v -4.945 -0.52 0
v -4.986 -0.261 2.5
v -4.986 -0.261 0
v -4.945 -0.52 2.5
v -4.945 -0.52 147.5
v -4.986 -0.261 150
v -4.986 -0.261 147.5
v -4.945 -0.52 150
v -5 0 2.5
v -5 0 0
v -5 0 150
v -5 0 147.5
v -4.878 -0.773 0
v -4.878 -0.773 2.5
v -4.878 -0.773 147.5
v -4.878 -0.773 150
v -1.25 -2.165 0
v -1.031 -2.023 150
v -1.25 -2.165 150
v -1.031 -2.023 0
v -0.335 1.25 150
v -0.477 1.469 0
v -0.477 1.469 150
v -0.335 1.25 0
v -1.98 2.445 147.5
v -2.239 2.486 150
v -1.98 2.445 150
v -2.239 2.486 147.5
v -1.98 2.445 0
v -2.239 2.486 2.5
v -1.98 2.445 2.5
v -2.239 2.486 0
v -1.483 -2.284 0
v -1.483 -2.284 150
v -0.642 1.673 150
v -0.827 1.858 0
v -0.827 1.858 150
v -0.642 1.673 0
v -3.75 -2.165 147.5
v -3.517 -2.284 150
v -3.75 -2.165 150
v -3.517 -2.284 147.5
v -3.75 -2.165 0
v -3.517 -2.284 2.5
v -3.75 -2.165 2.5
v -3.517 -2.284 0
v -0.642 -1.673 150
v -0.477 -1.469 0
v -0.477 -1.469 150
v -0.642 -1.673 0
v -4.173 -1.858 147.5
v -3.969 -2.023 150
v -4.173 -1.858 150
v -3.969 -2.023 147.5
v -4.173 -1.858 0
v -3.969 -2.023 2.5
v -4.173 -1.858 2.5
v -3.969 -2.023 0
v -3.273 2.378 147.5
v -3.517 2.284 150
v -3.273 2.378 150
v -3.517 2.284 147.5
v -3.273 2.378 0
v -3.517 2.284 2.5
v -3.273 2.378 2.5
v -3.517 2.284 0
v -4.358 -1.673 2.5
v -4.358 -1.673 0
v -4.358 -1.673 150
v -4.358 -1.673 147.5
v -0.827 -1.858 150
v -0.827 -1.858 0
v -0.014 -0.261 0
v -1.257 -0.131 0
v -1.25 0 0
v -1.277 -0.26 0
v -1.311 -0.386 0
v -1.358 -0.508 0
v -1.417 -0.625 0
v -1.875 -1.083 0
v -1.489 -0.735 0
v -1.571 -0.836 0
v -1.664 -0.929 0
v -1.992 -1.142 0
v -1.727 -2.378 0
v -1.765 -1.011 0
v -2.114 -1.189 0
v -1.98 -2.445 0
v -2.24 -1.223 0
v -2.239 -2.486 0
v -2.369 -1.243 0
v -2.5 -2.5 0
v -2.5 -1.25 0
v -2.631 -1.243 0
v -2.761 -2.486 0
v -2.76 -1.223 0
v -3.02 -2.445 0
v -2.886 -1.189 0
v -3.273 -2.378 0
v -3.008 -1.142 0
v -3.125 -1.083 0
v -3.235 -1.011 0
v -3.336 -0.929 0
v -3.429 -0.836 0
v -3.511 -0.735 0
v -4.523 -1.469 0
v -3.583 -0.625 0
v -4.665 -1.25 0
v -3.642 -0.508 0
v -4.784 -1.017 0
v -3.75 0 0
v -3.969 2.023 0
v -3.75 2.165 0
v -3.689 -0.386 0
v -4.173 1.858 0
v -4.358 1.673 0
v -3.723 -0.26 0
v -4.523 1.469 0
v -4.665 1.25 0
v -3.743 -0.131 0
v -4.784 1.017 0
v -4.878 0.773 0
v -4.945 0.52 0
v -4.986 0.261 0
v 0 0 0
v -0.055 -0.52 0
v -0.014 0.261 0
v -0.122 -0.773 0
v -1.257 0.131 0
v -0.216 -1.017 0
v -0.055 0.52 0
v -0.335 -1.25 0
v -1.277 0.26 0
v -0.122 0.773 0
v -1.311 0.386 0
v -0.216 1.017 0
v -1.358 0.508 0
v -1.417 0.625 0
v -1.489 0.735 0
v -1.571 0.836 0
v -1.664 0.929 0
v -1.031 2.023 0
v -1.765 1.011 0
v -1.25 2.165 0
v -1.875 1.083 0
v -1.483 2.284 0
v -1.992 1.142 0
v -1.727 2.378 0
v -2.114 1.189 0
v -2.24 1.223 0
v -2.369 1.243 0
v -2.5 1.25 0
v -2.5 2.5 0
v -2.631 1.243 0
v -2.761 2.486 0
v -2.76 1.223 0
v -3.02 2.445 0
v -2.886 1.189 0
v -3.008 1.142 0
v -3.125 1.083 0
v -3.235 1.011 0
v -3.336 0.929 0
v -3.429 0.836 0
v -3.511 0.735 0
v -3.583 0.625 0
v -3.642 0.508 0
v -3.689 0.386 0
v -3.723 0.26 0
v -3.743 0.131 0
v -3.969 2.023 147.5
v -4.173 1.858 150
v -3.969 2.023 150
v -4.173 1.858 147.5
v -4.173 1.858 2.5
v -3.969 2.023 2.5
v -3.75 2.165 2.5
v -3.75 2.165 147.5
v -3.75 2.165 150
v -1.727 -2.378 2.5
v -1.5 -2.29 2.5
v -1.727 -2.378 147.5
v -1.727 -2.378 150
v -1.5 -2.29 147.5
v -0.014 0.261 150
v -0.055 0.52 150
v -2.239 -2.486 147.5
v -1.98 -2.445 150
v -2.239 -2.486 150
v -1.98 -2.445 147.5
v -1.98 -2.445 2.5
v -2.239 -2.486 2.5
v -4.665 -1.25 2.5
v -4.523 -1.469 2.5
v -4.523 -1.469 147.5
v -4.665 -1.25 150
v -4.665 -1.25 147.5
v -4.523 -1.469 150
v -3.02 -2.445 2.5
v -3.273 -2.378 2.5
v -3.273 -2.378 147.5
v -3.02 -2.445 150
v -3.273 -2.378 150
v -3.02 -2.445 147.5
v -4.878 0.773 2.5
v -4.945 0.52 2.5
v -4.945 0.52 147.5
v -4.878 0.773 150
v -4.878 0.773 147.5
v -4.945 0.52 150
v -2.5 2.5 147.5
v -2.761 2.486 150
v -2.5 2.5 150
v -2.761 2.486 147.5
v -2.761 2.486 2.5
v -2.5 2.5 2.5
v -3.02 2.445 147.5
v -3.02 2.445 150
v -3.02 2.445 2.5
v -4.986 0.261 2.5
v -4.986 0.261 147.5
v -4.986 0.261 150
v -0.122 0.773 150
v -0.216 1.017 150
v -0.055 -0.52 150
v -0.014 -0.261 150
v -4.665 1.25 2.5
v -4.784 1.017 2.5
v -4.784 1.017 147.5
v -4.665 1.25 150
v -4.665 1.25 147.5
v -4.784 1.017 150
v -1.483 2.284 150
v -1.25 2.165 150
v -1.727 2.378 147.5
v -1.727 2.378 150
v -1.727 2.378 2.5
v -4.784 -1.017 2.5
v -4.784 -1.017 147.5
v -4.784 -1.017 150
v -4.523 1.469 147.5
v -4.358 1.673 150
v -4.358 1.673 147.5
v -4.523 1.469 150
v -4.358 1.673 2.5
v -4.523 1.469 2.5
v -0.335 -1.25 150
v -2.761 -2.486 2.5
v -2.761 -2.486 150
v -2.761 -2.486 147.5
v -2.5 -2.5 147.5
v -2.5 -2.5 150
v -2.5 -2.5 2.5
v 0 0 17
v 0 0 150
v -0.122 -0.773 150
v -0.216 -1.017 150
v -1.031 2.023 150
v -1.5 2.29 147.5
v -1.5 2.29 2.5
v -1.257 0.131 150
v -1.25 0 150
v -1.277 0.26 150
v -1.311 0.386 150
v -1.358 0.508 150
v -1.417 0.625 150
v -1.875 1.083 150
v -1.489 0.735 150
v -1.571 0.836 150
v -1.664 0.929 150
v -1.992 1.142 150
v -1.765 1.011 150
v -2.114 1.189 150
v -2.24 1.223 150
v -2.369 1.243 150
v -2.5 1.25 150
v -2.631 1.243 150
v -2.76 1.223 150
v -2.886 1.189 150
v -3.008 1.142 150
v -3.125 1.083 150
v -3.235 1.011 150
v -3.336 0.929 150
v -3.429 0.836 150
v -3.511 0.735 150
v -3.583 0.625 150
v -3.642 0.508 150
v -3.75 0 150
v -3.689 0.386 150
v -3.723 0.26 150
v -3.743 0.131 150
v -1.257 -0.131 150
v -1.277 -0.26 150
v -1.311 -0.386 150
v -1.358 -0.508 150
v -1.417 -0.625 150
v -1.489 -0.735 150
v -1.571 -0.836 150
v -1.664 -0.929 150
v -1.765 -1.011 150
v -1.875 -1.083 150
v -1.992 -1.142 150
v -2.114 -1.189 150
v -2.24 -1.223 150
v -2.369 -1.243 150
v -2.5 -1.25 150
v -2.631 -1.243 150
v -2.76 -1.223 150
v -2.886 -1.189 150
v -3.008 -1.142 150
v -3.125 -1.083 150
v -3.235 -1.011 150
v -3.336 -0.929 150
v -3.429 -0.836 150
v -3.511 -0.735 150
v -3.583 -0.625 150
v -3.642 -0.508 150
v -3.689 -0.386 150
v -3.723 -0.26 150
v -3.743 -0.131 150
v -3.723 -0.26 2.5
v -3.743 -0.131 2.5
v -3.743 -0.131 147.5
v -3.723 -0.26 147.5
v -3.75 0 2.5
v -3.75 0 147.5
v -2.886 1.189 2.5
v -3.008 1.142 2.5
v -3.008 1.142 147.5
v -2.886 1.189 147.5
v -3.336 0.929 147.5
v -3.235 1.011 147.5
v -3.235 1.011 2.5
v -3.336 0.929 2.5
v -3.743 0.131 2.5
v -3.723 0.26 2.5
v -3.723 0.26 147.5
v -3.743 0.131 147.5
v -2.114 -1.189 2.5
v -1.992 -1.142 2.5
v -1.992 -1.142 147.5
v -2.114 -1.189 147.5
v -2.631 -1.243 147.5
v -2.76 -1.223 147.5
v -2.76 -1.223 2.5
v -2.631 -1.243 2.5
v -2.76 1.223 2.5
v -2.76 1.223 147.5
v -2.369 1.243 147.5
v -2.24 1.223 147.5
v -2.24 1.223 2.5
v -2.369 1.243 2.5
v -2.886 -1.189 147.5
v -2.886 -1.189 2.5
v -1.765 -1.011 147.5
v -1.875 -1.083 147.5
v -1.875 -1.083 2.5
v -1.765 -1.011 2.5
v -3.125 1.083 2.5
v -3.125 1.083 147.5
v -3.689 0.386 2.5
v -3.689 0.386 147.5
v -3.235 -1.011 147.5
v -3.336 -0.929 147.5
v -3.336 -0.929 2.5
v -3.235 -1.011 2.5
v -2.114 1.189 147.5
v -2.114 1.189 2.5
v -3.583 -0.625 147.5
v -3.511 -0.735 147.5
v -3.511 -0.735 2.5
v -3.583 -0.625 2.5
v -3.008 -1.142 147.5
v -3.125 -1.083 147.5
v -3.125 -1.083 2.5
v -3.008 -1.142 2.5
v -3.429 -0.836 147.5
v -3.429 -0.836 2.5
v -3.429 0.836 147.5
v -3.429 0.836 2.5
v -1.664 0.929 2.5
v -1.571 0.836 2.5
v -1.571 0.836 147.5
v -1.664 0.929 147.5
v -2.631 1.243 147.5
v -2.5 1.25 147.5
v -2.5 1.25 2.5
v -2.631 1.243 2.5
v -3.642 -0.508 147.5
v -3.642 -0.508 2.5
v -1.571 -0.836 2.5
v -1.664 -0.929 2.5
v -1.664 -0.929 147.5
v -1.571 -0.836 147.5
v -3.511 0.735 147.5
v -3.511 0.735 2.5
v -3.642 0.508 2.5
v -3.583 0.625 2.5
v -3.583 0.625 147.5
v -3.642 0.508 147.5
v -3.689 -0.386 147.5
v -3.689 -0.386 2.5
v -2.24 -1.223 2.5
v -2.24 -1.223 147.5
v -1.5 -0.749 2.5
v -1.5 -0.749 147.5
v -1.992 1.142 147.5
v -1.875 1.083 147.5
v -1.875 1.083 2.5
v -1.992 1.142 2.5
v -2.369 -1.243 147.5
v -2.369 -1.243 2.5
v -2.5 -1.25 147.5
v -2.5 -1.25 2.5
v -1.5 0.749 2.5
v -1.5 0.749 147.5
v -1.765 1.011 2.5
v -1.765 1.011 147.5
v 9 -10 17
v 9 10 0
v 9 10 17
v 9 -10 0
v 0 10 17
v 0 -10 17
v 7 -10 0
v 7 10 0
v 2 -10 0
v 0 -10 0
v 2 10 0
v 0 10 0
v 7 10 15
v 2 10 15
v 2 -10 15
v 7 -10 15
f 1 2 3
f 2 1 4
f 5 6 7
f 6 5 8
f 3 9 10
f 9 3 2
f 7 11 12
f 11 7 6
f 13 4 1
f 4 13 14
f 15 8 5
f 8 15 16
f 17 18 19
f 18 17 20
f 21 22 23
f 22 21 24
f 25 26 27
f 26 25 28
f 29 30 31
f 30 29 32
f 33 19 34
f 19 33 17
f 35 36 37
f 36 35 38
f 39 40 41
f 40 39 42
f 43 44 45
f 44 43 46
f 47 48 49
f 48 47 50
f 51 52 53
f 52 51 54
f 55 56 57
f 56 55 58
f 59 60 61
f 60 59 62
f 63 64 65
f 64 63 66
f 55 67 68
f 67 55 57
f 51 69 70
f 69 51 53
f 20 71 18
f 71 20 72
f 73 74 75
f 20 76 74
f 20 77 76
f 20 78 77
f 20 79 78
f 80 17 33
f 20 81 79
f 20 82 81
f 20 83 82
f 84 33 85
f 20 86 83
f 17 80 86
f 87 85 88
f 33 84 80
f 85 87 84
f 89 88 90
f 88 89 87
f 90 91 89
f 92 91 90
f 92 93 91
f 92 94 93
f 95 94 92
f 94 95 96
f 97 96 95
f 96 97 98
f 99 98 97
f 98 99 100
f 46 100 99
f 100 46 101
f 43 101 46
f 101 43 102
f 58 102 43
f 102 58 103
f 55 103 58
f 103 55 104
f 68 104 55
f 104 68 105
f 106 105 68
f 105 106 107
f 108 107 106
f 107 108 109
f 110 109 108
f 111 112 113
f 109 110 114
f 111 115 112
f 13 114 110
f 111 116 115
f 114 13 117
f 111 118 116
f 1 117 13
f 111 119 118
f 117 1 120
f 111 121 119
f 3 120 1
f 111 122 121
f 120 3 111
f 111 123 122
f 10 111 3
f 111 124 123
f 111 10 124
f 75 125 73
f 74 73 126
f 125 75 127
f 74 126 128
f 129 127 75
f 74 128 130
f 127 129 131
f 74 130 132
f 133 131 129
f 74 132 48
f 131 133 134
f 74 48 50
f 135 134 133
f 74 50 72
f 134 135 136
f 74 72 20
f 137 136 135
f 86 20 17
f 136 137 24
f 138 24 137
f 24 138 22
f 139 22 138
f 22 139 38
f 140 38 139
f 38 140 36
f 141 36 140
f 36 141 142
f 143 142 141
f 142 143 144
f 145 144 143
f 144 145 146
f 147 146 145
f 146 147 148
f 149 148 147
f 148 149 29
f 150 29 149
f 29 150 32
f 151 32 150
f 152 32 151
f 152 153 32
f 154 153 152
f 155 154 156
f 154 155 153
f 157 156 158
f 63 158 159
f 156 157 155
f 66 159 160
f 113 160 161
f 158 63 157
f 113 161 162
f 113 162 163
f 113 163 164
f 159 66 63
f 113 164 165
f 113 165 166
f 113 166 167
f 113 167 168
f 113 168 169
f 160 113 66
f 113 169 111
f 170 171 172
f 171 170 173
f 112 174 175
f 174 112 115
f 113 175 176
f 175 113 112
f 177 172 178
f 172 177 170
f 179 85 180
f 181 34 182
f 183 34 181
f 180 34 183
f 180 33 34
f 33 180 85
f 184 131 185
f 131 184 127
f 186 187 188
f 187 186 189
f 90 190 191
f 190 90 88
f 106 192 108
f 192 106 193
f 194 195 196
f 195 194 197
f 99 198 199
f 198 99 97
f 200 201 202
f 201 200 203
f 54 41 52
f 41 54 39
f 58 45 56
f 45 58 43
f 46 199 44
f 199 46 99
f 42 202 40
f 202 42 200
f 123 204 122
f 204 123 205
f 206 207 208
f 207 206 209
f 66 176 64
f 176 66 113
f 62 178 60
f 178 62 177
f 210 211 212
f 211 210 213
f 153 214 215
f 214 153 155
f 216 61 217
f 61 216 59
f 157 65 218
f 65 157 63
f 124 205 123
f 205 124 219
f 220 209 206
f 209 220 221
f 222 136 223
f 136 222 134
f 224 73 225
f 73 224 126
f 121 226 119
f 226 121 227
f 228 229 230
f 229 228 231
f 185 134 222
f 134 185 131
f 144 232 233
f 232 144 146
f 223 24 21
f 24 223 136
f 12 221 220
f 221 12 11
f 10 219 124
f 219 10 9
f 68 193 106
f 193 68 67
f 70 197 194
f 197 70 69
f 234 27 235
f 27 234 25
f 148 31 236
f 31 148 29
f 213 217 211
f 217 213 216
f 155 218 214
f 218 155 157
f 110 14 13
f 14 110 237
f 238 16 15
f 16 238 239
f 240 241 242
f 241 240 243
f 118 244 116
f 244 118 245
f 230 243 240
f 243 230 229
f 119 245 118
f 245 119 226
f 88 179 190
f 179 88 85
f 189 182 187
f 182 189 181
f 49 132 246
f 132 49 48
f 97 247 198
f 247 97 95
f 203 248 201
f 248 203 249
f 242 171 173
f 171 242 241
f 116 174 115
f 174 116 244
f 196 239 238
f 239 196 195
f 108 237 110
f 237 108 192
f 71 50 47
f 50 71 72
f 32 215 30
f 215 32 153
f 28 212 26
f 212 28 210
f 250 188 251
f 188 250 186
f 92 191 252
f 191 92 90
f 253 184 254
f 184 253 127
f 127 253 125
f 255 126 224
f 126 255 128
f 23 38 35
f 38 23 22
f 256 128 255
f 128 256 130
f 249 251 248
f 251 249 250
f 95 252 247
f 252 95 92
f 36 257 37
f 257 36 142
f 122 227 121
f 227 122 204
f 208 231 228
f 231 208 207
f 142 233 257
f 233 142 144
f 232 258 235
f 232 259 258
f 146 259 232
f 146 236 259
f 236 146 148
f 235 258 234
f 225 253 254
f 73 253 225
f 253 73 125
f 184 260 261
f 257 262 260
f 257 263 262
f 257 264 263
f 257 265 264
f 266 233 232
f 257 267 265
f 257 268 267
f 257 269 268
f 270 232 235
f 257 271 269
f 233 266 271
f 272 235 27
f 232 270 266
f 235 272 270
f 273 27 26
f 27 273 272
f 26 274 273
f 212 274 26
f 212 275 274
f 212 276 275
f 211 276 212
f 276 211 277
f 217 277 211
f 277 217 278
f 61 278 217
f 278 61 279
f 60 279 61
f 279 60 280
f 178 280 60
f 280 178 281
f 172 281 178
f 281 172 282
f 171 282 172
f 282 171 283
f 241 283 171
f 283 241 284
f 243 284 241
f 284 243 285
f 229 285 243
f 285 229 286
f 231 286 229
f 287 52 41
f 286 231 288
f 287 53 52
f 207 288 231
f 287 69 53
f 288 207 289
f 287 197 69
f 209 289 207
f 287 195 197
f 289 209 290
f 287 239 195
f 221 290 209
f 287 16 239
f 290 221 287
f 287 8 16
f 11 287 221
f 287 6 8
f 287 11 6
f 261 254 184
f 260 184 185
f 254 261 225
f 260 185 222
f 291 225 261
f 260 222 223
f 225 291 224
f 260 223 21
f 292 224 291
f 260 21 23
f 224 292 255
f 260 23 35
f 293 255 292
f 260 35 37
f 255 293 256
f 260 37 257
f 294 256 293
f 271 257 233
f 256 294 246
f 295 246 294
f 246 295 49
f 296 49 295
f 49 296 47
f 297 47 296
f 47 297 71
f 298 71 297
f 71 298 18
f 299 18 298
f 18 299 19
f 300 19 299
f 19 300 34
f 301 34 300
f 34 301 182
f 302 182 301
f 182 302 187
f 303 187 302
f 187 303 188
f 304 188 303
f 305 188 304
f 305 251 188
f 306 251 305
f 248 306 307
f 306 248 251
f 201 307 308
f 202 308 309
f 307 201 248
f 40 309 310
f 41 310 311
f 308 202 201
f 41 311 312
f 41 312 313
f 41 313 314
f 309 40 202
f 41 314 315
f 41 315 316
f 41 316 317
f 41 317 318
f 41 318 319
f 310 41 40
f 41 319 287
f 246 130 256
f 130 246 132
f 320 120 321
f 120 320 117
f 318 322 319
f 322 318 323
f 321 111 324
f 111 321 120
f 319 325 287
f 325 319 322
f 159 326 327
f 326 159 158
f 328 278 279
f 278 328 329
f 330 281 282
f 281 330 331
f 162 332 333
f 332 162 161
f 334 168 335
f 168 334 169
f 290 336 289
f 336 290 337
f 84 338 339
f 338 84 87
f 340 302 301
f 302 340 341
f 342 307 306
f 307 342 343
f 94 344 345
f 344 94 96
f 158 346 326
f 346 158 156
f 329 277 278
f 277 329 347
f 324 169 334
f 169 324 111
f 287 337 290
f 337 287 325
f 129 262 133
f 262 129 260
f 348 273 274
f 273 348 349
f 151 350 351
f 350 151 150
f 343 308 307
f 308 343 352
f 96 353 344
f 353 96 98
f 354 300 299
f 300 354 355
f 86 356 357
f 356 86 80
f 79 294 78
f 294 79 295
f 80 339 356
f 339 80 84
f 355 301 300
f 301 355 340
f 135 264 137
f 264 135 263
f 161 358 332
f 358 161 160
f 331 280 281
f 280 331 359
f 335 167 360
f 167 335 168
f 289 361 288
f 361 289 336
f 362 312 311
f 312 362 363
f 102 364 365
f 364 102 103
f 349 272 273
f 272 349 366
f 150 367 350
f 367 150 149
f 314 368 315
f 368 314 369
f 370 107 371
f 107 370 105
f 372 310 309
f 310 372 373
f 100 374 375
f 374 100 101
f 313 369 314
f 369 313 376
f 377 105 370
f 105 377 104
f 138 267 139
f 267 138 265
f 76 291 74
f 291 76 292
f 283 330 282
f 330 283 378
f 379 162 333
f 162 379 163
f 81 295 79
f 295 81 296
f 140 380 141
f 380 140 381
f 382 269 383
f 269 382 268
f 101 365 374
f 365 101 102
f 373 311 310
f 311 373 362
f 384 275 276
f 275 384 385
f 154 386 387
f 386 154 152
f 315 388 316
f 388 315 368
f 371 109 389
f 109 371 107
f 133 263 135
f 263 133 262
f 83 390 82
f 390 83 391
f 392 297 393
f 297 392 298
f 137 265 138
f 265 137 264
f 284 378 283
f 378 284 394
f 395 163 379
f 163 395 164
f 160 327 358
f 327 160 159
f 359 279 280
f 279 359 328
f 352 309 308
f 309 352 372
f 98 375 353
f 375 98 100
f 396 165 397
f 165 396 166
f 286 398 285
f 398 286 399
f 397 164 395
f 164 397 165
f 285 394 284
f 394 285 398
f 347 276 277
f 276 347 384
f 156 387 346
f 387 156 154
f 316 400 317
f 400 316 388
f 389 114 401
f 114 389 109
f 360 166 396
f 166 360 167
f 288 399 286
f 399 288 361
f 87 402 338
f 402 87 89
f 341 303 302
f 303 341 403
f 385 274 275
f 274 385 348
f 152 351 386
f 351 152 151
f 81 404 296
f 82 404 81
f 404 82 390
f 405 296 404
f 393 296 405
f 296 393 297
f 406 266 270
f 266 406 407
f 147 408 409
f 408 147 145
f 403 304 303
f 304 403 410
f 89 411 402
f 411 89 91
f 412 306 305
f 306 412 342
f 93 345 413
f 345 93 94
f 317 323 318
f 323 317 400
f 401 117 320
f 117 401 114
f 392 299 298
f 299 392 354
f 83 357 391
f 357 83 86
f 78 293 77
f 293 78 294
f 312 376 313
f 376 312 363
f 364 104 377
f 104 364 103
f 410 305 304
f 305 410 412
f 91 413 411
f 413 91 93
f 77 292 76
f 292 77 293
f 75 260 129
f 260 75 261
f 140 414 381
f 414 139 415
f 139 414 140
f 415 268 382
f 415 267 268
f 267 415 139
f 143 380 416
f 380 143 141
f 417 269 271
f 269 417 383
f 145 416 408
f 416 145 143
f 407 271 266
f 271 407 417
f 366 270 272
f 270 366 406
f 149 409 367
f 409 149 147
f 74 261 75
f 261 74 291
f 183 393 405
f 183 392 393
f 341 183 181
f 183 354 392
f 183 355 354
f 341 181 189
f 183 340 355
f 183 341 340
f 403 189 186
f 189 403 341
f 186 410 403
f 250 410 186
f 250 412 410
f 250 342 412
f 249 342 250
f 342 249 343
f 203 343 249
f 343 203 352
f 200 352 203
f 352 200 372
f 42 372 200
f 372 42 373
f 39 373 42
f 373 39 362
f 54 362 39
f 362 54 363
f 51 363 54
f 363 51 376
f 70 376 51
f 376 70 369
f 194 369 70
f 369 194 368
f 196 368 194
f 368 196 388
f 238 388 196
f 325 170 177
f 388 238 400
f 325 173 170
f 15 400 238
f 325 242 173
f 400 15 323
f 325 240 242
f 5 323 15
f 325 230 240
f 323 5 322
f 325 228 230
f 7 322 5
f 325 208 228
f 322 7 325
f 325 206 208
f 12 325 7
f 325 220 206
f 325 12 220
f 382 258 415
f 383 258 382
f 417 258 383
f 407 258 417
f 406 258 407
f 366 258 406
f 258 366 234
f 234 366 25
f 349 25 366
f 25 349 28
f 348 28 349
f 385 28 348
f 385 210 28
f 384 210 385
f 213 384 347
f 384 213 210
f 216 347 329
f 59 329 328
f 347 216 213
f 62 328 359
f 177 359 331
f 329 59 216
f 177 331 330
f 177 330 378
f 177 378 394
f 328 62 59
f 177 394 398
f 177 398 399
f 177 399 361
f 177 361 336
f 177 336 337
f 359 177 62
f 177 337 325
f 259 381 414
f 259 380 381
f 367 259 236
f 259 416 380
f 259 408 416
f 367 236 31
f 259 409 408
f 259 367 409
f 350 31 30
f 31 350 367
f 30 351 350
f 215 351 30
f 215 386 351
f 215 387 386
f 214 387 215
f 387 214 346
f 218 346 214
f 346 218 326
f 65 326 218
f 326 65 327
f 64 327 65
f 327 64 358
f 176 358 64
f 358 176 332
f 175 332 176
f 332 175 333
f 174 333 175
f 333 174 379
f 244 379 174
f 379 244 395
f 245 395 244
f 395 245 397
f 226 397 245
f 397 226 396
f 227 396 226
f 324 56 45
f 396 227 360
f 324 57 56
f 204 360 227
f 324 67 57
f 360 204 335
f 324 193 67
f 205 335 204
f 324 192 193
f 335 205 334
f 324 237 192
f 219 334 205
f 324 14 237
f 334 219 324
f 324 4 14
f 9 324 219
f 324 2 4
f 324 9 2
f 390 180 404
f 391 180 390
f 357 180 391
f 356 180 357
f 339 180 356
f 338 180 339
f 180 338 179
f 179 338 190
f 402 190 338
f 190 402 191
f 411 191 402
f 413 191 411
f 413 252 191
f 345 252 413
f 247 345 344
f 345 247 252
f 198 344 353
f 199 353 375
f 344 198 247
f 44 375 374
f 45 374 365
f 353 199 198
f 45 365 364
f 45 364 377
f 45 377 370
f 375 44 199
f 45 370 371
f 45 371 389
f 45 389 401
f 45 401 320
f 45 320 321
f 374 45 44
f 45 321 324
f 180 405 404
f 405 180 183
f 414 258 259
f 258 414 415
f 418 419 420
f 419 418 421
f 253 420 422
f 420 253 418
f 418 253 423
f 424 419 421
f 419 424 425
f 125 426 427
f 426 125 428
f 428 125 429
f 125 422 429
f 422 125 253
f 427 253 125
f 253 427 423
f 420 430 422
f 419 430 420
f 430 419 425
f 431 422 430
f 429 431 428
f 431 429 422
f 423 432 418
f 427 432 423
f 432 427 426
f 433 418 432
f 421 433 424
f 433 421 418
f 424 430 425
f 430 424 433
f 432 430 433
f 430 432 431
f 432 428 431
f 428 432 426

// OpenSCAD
$fn = 60;

//engravepercente is from 0 to 100, close to 0 you get a full bow, close to 100 you get a thin bow 
//add some tolerance for filamentthickness
module bow(height, filamentthickness, bowthickness, engravepercent) {
        bowdiameter = filamentthickness + bowthickness;
        translate([-bowdiameter/2, 0, height/2]) {
                rotate([0, 0, 180]) {
                        difference() {
                                cylinder(d=bowdiameter, h = height, center = true);
                                cylinder(d=filamentthickness, h = height, center = true);
                                translate([ (bowdiameter - (bowdiameter * engravepercent/100)) /2, 0, 0]) {
                                        cube([ bowdiameter * engravepercent/100, bowdiameter,height - (bowthickness * 2)], center = true
                                        );
                                }
                        }
                }
        }
}

module clip(frameheight, framethickness, clipthickness) {
       translate([0, -10,0]) { 
                difference() {
                       cube([framethickness + (2 * clipthickness), 20, frameheight + clipthickness]);
                        translate([clipthickness, 0, 0]) {
                                cube([framethickness, 20, frameheight]);
                        }
                }
        }
}


bow(150, 2.5, 2.5, 70);
clip(15, 5, 2);
